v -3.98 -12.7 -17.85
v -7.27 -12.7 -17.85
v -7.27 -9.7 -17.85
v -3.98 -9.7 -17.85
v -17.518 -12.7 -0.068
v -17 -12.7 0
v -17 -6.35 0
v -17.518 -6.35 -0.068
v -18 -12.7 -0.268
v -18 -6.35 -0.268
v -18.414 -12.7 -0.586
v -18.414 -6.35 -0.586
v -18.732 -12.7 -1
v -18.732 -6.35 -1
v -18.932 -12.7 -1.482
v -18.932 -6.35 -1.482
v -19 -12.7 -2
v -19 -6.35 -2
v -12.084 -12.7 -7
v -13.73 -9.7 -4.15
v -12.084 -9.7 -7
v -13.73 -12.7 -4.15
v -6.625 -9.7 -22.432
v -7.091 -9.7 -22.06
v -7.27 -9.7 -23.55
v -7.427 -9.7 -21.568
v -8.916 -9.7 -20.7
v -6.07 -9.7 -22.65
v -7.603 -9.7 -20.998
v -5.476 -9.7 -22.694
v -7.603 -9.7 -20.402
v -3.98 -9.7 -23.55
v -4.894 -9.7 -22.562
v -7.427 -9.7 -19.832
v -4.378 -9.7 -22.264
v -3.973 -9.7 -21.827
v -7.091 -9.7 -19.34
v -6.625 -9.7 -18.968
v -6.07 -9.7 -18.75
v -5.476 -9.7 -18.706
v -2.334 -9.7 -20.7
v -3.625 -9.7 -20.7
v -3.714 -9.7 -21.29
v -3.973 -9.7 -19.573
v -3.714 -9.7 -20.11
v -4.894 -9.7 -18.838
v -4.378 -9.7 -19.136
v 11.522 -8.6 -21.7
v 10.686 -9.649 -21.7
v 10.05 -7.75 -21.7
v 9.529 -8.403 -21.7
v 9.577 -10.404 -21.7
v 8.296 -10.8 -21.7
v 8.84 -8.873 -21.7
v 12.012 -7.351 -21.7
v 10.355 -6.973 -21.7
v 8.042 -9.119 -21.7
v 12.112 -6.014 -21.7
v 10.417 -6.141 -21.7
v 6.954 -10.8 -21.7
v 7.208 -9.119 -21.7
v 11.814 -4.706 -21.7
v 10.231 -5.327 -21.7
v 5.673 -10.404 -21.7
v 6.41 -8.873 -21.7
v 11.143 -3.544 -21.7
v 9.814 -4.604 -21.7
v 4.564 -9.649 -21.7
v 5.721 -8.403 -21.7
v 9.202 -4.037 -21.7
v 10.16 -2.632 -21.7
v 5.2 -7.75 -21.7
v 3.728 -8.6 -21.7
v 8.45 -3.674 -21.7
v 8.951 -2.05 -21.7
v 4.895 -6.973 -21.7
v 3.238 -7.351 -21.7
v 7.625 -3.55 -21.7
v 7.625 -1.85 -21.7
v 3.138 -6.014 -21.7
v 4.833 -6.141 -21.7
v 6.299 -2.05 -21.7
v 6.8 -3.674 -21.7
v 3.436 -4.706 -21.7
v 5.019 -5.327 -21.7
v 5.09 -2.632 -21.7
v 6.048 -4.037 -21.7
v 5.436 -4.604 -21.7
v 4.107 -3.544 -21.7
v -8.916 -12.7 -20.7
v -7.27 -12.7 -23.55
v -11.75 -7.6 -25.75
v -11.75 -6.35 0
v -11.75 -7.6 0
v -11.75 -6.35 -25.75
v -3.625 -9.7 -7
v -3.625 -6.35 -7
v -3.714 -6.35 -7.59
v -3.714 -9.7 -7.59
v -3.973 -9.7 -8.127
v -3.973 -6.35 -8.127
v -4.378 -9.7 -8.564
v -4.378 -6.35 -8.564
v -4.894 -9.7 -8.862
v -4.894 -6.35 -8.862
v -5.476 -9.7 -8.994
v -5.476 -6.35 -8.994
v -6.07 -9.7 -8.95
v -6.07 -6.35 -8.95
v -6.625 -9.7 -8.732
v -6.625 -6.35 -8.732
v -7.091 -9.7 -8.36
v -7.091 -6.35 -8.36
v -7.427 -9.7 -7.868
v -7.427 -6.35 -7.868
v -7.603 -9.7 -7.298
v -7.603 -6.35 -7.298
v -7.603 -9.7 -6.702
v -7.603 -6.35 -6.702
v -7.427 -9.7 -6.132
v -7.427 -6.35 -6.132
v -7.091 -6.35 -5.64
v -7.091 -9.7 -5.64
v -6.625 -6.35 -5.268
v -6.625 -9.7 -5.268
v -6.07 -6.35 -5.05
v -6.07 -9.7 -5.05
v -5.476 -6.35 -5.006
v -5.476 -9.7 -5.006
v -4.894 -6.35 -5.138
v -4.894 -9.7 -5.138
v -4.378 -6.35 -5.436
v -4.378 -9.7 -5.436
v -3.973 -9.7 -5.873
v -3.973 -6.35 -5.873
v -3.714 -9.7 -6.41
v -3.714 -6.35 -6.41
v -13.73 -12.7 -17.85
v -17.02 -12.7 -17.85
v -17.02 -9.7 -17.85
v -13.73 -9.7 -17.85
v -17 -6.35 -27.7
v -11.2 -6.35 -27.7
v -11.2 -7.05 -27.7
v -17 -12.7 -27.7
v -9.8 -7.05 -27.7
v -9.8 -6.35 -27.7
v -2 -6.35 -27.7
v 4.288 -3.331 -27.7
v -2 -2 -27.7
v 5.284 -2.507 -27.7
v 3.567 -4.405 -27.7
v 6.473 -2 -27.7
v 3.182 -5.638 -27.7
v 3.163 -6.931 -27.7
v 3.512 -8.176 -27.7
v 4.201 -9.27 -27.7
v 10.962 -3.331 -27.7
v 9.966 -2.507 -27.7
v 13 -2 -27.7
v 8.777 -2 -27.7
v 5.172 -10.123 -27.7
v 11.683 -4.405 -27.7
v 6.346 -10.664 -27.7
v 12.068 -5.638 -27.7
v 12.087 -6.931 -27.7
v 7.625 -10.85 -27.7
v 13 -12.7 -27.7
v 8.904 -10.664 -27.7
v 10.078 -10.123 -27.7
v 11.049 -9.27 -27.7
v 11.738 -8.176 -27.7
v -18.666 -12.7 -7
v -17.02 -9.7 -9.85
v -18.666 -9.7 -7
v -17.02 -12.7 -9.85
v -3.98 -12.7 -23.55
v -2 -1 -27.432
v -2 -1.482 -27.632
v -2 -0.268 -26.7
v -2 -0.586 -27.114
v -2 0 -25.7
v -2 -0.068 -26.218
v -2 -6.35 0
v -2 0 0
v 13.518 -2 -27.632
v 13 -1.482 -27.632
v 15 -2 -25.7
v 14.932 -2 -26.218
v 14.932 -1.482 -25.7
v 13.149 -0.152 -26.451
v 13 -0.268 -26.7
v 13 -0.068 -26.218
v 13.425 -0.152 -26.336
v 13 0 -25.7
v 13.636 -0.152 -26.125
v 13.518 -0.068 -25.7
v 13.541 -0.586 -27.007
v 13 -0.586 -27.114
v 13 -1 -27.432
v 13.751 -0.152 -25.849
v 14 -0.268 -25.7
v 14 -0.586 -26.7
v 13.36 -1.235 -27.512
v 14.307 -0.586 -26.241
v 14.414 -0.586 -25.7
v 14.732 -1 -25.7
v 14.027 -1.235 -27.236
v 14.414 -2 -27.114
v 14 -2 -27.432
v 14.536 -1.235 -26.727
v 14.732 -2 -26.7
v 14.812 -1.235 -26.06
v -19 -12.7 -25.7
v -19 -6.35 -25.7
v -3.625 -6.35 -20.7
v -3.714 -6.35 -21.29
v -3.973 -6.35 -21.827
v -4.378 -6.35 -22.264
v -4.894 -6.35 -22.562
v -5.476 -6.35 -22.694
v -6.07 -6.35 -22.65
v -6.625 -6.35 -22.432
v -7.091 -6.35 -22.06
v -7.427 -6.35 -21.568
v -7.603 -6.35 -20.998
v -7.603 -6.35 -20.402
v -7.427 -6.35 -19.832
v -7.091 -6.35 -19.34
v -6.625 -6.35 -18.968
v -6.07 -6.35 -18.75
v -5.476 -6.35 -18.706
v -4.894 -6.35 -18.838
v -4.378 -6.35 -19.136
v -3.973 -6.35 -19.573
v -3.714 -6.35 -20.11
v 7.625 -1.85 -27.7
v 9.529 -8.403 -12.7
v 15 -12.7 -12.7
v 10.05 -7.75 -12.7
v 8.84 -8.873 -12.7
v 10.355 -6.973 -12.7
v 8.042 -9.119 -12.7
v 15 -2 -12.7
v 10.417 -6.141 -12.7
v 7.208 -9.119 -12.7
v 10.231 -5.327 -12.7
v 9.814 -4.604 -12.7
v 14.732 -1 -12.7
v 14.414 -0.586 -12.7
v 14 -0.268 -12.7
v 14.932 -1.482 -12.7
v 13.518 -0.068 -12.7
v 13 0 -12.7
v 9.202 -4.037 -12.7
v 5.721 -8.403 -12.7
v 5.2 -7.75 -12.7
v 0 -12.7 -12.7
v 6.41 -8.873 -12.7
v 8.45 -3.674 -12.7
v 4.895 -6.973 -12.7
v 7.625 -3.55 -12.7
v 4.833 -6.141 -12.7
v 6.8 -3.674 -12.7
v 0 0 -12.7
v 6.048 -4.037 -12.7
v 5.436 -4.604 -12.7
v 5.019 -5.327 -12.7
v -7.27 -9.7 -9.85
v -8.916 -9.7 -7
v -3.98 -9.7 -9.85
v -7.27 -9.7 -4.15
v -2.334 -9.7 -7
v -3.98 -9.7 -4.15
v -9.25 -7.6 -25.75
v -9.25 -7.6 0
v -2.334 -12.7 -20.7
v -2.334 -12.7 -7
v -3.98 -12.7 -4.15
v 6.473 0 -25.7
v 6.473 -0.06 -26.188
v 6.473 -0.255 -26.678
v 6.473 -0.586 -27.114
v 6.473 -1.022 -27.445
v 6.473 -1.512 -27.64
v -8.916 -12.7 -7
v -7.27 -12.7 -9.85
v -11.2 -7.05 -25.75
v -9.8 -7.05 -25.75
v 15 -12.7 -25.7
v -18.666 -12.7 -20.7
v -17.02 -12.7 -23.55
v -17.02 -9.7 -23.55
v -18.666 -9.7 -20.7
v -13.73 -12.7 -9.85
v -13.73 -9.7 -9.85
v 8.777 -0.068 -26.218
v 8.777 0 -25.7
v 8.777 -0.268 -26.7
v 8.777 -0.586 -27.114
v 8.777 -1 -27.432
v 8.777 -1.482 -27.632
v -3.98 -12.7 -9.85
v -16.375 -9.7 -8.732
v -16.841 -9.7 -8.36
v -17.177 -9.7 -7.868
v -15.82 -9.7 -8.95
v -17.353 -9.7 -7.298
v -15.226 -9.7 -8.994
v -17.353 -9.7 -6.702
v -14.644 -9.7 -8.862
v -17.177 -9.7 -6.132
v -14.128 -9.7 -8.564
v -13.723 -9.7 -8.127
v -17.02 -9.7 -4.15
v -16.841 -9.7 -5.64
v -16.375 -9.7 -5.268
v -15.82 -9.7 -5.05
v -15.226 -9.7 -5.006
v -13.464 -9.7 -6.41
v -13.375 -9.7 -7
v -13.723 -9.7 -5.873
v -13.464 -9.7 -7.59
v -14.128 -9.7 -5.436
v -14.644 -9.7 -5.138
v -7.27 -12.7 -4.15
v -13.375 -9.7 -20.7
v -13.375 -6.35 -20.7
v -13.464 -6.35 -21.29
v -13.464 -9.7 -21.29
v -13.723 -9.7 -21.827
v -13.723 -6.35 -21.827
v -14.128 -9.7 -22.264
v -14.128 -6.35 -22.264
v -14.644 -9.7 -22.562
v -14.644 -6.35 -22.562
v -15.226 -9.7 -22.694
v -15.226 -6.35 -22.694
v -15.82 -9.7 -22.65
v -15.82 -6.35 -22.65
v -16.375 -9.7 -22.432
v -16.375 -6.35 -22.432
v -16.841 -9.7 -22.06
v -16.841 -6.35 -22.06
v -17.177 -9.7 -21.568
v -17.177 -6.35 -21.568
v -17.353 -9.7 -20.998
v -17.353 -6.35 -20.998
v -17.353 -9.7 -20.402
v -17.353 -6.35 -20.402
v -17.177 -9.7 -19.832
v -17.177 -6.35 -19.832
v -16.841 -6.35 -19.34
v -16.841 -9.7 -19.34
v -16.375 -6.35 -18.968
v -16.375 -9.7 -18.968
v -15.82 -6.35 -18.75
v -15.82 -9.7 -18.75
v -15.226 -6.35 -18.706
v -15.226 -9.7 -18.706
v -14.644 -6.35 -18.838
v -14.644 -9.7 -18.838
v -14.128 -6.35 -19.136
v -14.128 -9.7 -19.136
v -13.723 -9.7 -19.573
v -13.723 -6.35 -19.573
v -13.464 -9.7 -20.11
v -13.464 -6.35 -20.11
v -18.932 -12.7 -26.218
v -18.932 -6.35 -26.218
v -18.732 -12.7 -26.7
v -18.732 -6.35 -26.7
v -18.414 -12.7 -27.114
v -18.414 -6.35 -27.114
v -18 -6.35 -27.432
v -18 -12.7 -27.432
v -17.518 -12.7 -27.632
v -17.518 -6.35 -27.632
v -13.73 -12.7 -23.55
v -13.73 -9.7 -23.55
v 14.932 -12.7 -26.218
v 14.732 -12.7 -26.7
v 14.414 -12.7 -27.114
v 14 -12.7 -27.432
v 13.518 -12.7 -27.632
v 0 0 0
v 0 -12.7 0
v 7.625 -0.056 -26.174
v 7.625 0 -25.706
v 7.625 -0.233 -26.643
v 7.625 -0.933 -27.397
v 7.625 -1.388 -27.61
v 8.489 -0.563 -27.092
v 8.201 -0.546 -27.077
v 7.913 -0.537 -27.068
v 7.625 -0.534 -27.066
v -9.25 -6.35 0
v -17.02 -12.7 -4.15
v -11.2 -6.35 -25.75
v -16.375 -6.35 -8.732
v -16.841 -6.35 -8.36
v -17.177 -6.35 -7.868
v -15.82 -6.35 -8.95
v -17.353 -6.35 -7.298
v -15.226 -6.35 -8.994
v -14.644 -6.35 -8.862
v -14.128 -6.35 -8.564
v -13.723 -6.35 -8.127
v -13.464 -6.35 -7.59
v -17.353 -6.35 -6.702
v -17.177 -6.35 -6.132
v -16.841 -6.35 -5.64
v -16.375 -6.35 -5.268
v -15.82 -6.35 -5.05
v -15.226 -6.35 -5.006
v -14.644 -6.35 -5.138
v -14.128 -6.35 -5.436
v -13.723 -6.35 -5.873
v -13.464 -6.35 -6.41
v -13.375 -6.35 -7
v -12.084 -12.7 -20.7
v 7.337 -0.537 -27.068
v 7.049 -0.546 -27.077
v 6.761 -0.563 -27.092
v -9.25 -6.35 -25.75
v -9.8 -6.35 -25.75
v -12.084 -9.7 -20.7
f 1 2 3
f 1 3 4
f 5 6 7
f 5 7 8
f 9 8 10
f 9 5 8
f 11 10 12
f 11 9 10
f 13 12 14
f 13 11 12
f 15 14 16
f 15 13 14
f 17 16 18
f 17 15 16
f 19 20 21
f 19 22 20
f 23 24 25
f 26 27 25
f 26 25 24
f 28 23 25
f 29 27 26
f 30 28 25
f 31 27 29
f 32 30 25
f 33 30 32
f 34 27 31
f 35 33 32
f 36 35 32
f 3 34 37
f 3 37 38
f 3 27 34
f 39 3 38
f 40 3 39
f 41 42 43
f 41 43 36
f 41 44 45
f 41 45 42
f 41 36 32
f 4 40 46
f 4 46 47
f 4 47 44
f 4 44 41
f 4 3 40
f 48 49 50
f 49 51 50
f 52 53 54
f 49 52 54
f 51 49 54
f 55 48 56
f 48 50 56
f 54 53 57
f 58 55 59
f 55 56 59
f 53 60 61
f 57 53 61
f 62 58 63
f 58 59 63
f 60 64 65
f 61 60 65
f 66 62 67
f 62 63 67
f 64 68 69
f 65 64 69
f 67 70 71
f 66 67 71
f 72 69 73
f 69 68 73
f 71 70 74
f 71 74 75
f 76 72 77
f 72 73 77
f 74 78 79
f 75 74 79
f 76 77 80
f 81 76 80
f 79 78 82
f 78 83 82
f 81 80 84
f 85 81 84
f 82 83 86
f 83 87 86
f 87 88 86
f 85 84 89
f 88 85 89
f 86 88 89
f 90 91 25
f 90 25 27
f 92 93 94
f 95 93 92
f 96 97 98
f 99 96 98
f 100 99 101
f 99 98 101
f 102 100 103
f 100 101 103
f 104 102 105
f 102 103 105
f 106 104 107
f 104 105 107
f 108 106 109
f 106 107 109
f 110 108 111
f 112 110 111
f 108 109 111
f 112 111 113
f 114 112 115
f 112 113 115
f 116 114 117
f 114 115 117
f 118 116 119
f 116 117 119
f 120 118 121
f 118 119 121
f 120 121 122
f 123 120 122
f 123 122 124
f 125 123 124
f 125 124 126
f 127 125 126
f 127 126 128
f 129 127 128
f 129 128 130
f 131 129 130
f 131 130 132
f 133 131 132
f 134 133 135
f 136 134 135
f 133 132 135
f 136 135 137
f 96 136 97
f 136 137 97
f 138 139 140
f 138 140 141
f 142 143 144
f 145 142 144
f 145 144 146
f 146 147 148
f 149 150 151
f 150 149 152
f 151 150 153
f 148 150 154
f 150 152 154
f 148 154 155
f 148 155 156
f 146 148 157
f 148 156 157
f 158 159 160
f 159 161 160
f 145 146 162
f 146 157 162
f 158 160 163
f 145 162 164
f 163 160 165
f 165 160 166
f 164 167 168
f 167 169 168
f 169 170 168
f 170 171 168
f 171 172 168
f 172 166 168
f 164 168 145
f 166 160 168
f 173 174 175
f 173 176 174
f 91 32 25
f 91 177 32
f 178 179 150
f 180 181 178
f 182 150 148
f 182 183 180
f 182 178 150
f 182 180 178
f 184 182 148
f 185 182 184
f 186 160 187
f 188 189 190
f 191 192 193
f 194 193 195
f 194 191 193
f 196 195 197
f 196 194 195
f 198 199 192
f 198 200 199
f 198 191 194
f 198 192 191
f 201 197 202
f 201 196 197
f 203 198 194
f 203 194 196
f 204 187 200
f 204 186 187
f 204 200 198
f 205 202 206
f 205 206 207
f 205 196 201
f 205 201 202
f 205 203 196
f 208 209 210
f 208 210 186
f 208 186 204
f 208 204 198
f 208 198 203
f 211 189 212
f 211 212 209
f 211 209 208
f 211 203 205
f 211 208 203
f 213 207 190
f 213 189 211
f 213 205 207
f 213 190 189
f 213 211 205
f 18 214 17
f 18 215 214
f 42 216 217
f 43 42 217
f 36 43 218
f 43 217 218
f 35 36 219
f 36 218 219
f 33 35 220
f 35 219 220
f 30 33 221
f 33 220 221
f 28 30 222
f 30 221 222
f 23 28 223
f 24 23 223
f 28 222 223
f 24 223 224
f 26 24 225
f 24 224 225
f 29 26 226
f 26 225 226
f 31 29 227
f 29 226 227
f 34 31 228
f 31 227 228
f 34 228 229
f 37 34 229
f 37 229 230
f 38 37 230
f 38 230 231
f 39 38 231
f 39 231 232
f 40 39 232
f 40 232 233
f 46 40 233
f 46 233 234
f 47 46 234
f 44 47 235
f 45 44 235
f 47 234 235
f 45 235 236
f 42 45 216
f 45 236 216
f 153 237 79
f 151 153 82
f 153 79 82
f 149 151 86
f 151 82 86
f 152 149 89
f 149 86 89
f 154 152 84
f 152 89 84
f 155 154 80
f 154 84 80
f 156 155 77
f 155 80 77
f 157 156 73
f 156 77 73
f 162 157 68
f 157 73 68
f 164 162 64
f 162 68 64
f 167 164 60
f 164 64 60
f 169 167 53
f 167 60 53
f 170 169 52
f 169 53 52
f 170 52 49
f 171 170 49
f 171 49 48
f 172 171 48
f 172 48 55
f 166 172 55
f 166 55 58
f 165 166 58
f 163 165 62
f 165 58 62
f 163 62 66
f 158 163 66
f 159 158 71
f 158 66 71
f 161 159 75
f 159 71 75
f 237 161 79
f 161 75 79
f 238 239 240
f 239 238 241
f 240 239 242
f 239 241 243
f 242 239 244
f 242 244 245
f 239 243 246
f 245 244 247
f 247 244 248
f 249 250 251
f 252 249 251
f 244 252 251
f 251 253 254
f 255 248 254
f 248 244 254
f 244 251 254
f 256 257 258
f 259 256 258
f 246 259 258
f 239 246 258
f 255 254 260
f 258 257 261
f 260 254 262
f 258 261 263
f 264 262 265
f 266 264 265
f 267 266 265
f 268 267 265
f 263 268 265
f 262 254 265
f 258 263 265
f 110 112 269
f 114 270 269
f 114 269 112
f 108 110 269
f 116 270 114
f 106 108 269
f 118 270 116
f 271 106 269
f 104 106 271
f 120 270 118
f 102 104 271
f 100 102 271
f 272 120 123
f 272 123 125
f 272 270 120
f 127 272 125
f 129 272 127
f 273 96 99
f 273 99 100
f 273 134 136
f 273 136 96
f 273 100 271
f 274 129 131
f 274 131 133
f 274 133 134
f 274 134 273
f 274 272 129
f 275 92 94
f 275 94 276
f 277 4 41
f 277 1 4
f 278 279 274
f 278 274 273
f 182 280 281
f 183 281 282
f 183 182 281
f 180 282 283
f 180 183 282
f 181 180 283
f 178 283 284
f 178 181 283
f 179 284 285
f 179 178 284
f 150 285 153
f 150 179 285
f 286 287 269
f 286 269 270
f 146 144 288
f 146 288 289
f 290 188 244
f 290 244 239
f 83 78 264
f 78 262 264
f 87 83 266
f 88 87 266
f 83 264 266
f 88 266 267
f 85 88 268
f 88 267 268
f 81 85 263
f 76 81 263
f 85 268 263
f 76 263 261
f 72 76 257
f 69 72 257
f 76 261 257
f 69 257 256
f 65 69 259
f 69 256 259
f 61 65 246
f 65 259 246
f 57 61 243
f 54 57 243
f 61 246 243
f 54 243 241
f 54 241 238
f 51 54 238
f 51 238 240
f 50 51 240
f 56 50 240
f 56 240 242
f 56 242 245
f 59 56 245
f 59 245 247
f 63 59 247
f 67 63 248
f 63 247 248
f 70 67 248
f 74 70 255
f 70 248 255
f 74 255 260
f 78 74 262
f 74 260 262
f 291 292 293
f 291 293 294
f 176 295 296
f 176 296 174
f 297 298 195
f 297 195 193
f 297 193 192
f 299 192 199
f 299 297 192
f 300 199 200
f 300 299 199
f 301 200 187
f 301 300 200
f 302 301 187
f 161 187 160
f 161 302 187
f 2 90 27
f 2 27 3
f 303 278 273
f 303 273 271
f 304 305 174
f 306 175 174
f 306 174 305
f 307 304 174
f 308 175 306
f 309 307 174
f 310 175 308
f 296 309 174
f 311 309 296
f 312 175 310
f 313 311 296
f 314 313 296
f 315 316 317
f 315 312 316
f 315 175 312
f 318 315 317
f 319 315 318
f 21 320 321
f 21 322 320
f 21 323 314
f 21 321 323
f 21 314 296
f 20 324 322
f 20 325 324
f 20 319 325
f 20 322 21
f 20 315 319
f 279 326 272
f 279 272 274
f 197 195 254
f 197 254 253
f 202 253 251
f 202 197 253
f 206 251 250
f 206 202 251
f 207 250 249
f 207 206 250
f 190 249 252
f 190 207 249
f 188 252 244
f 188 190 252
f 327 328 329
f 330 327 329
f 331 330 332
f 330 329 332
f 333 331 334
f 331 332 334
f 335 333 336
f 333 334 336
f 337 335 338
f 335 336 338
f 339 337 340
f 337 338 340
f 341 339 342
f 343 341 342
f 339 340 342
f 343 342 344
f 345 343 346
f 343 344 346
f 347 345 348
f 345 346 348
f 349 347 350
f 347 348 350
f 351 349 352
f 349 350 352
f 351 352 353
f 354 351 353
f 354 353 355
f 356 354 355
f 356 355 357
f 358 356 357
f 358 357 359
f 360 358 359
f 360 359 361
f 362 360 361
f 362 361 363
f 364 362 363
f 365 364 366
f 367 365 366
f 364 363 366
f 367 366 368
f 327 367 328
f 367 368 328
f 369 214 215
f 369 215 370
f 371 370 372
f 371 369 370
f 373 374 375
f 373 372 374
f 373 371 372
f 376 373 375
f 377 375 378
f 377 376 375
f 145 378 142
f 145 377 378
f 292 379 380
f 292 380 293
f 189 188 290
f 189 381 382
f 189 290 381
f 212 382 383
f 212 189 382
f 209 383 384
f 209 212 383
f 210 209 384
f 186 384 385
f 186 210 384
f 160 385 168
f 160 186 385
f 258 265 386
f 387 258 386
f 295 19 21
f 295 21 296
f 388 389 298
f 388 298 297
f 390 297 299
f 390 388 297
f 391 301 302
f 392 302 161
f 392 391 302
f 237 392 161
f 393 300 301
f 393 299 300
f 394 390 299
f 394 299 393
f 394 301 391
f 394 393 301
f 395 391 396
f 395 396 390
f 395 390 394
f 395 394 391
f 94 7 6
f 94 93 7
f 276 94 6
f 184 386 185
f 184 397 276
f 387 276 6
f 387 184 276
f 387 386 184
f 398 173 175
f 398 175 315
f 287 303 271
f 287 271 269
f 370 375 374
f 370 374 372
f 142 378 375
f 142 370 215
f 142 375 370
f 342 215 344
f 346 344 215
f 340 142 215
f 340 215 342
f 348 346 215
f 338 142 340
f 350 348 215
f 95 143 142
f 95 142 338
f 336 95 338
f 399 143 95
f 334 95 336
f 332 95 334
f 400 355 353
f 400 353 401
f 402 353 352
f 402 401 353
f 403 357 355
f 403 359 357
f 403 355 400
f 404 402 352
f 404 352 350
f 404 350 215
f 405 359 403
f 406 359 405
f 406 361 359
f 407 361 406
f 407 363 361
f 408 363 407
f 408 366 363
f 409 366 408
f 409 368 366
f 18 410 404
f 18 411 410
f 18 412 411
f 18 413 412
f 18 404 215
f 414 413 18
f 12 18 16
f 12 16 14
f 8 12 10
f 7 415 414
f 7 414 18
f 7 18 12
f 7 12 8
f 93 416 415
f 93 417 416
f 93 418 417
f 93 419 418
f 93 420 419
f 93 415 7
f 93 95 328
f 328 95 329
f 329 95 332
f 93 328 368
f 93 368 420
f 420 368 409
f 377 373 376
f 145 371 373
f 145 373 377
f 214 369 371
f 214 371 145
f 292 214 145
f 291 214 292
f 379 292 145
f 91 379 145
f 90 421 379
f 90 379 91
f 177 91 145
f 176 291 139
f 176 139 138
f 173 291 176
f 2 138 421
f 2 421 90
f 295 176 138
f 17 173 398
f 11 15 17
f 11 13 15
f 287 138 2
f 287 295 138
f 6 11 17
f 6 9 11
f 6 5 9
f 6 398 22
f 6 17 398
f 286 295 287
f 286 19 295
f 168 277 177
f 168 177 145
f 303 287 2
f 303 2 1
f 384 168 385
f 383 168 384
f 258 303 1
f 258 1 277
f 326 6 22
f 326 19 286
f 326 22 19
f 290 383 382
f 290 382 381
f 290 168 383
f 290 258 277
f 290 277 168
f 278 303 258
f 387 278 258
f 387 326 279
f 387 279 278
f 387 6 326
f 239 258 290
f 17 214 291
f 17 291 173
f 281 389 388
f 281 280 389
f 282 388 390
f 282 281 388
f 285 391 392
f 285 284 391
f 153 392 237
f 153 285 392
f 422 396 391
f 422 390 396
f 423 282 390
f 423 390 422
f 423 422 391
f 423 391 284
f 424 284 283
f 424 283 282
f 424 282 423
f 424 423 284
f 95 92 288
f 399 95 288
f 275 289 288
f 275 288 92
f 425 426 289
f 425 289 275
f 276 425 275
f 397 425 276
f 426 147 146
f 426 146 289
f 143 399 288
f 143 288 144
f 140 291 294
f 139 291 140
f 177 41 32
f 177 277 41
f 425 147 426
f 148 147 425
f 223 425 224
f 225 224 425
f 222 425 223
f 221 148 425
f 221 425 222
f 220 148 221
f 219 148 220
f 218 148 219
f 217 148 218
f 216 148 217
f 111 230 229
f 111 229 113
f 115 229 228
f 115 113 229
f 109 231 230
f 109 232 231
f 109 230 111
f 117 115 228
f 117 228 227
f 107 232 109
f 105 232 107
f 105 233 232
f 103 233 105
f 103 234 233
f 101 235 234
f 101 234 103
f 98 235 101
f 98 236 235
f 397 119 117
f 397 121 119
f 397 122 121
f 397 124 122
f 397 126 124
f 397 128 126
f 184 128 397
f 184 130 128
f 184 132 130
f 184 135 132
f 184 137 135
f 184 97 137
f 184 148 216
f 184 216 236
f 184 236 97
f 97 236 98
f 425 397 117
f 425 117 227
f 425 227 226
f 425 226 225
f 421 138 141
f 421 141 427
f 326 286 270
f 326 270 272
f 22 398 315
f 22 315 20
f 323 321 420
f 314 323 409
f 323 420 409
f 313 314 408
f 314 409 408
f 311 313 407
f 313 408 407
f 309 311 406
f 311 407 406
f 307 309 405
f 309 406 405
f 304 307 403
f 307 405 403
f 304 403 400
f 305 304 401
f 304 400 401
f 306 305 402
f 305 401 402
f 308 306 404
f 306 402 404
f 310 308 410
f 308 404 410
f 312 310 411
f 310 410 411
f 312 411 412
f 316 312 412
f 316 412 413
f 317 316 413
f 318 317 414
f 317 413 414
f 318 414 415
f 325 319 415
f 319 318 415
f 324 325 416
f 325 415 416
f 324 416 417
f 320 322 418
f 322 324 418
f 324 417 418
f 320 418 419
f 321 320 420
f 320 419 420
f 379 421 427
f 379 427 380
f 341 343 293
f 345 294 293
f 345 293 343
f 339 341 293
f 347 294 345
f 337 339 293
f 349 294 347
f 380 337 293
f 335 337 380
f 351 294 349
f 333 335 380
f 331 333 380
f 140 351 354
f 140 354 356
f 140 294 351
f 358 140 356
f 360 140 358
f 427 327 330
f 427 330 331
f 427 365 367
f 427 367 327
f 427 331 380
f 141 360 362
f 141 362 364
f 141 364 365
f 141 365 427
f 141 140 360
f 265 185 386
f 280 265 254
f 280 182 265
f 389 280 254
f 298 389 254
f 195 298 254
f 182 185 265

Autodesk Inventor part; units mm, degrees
ref_plane "YZ Plane" through (0, 0, 0) normal (1, 0, 0) x (0, 1, 0)
ref_plane "XZ Plane" through (0, 0, 0) normal (0, 1, 0) x (-1, 0, 0)
ref_plane "Arbeitsebene1" through (0, 0, -12.7) normal (0, 0, -1) x (-1, 0, 0)
sketch "Skizze2" plane through (0, 0, -12.7) normal (0, 0, -1) x (-1, 0, 0)
  line L0 (-55.25, 0) -> (-55.25, -12.7) projected
  line L1 (0, -12.7) -> (-55.25, -12.7) projected
  line L2 (0, 0) -> (0, -12.7) projected
  line L3 (0, 0) -> (-55.25, 0) projected
  circle A0 centre (-47.625, -6.35) radius 2.75 projected
  circle A1 centre (-7.625, -6.35) radius 2.75 projected
  line L4 (0, 1.15) -> (-15, 1.15)
  line L5 (-15, 1.15) -> (-15, -13.85)
  line L6 (-15, -13.85) -> (0, -13.85)
  line L7 (0, -13.85) -> (0, 1.15)
  point P0 (-15, -6.35)
  dimension "d1" = 15
  dimension "d2" = 0
  dimension "d3" = 15
extrude "Extrusion1" add sketch "Skizze2" along normal blind 15 contours L5 L4 L7 L3 | L3 L2 L1 L5 | L1 L7 L6 L5 | A1
sketch "Skizze3" plane through (0, -13.85, -12.7) normal (-1, 0, 0) x (0, 0, 1)
  line L0 (12.7, 1.15) -> (12.7, 13.85) projected
  line L1 (-15, 0) -> (-15, 15) projected
  line L2 (-15, 15) -> (12.7, 15)
  line L3 (12.7, 15) -> (12.7, 0)
  line L4 (12.7, 0) -> (-15, 0)
  line L5 (-15, 0) -> (-15, 15)
  line L6 (0, 0) -> (-15, 0) projected
extrude "Extrusion2" add sketch "Skizze3" along normal blind 2
sketch "Skizze4" plane through (-2, -13.85, -12.7) normal (-1, 0, 0) x (0, 0, 1)
  line L0 (0, 0) -> (12.7, 0) projected
  line L1 (-15, 15) -> (-15, 0) projected
  line L2 (12.7, 0) -> (-15, 0)
  line L3 (-15, 0) -> (-15, 7.5)
  line L4 (-15, 7.5) -> (12.7, 7.5)
  line L5 (12.7, 7.5) -> (12.7, 0)
  line L6 (12.7, 0) -> (12.7, 15) projected
  point P0 (12.7, 13.85)
  point P1 (12.7, 7.5)
  point P2 (-1.15, 7.5)
extrude "Extrusion3" add sketch "Skizze4" along normal blind 17
sketch "Skizze5" plane through (-2, -6.35, 0) normal (0, 1, 0) x (1, 0, 0)
  line L0 (0, 27.7) -> (-17, 27.7) projected
  line L1 (0, 0) -> (0, 27.7) projected
  line L2 (0, 0) -> (-17, 0) projected
  line L3 (-17, 0) -> (-17, 27.7) projected
  line L4 (-7.25, 0) -> (-9.75, 0)
  line L5 (-9.75, 0) -> (-9.75, 25.75)
  line L6 (-9.75, 25.75) -> (-7.25, 25.75)
  line L7 (-7.25, 25.75) -> (-7.25, 0)
  point P0 (2, 0)
  point P1 (-8.5, 0)
  point P2 (-8.5, 0)
  dimension "d10" = 2.5
  dimension "d17" = 25.75
extrude "Extrusion4" cut sketch "Skizze5" against normal blind 1.25 contours L2 L5 L6 L7
sketch "Skizze6" plane through (-2, -6.35, 0) normal (0, 1, 0) x (1, 0, 0)
  line L0 (-9.75, 25.75) -> (-7.25, 25.75) projected
  line L1 (-7.25, 25.75) -> (-7.25, 0) projected
  line L2 (-9.75, 0) -> (-9.75, 25.75) projected
  line L3 (0, 27.7) -> (-17, 27.7) projected
  line L4 (-9.75, 25.75) -> (-7.25, 25.75) projected
  line L5 (-7.8, 25.75) -> (-9.2, 25.75)
  line L6 (-9.2, 25.75) -> (-9.2, 27.7)
  line L7 (-9.2, 27.7) -> (-7.8, 27.7)
  line L8 (-7.8, 27.7) -> (-7.8, 25.75)
  point P0 (2, 0)
  point P1 (-8.5, 25.75)
  point P2 (-8.5, 25.75)
  point P3 (-7.8, 27.7)
  dimension "d14" = 1.4
extrude "Extrusion5" cut sketch "Skizze6" against normal blind 0.7
sketch "Skizze7" plane through (-2, -6.35, 0) normal (0, 1, 0) x (1, 0, 0)
  circle A0 centre (-3.625, 7) radius 2
  circle A1 centre (-13.375, 7) radius 2
  circle A2 centre (-13.375, 20.7) radius 2
  circle A3 centre (-3.625, 20.7) radius 2
  line L0 (0, 0) -> (-7.25, 0) projected
  line L1 (-9.75, 0) -> (-17, 0) projected
  line L2 (-9.2, 27.7) -> (-17, 27.7) projected
  point P0 (2, 0)
  point P1 (-3.625, 0)
  point P2 (-13.375, 0)
  dimension "d18" = 4
  dimension "d19" = 4
  dimension "d20" = 4
  dimension "d21" = 4
  dimension "d22" = 7
  dimension "d23" = 7
extrude "Extrusion6" cut sketch "Skizze7" against normal blind 10
sketch "Skizze9" plane through (0, 0, -27.7) normal (0, 0, -1) x (-1, 0, 0)
  circle A0 centre (-7.625, -6.35) radius 2.75 projected
  point P0 (0, 0)
hole "Bohrung1" at (7.625, -6.35, -27.7) direction (0, 0, 1) diameter 5.6 depth 15 counterbore diameter 9 counterbore depth 6
sketch "Skizze10" plane through (0, 1.15, -12.7) normal (0, 1, 0) x (1, 0, 0)
  line L0 (19, -16) -> (-4, -16)
  line L1 (-4, -16) -> (-4, 20)
  line L2 (-4, 20) -> (19, 20)
  line L3 (19, 20) -> (19, -16)
  point P0 (0, -12.7)
extrude "Extrusion8" cut sketch "Skizze10" against normal blind 1.15
sketch "Skizze11" plane through (15, -13.85, -27.7) normal (0, -1, 0) x (1, 0, 0)
  line L0 (6, 49) -> (-39, 49)
  line L1 (-39, 49) -> (-39, -17)
  line L2 (-39, -17) -> (6, -17)
  line L3 (6, -17) -> (6, 49)
  point P0 (-15, 27.7)
extrude "Extrusion9" cut sketch "Skizze11" against normal blind 1.15
fillet "Rundung2" radius 2 5 edges at (-19, -9.525, -27.7) (-19, -9.525, 0) (15, -6.35, -27.7) (15, 0, -20.2) (6.5, 0, -27.7)
sketch "Skizze12" plane through (15, -12.7, -27.7) normal (0, -1, 0) x (1, 0, 0)
  circle A0 centre (-30.375, 20.7) radius 2 projected
  circle A1 centre (-20.625, 20.7) radius 2 projected
  circle A2 centre (-20.625, 7) radius 2 projected
  circle A3 centre (-30.375, 7) radius 2 projected
  line L0 (-27.0841, 20.7) -> (-28.7296, 17.85)
  line L1 (-28.7296, 17.85) -> (-32.0204, 17.85)
  line L2 (-32.0204, 17.85) -> (-33.6659, 20.7)
  line L3 (-33.6659, 20.7) -> (-32.0204, 23.55)
  line L4 (-32.0204, 23.55) -> (-28.7296, 23.55)
  line L5 (-28.7296, 23.55) -> (-27.0841, 20.7)
  line L6 (-17.3341, 20.7) -> (-18.9796, 17.85)
  line L7 (-18.9796, 17.85) -> (-22.2704, 17.85)
  line L8 (-22.2704, 17.85) -> (-23.9159, 20.7)
  line L9 (-23.9159, 20.7) -> (-22.2704, 23.55)
  line L10 (-22.2704, 23.55) -> (-18.9796, 23.55)
  line L11 (-18.9796, 23.55) -> (-17.3341, 20.7)
  line L12 (-17.3341, 7) -> (-18.9796, 4.15)
  line L13 (-18.9796, 4.15) -> (-22.2704, 4.15)
  line L14 (-22.2704, 4.15) -> (-23.9159, 7)
  line L15 (-23.9159, 7) -> (-22.2704, 9.85)
  line L16 (-22.2704, 9.85) -> (-18.9796, 9.85)
  line L17 (-18.9796, 9.85) -> (-17.3341, 7)
  line L18 (-28.7296, 4.15) -> (-32.0204, 4.15)
  line L19 (-32.0204, 4.15) -> (-33.6659, 7)
  line L20 (-33.6659, 7) -> (-32.0204, 9.85)
  line L21 (-32.0204, 9.85) -> (-28.7296, 9.85)
  line L22 (-28.7296, 9.85) -> (-27.0841, 7)
  line L23 (-27.0841, 7) -> (-28.7296, 4.15)
  line L24 (-2, 0) -> (-32, 0) projected
  point P0 (-15, 27.7)
  point P1 (-30.375, 17.85)
  point P2 (-20.625, 17.85)
  dimension "d43" = 5.7
extrude "Extrusion10" cut sketch "Skizze12" against normal blind 3 contours A1 | A2 | A3 | L0 L1 L2 L3 L4 L5 | L6 L7 L8 L9 L10 L11 | L12 L13 L14 L15 L16 L17 | L18 L19 L20 L21 L22 L23
equation "\"d19\" = d18"
equation "\"d20\" = d19"
equation "\"d21\" = d19"
equation "\"d23\" = d22"
properties part number "NadelhalterSchraub"
